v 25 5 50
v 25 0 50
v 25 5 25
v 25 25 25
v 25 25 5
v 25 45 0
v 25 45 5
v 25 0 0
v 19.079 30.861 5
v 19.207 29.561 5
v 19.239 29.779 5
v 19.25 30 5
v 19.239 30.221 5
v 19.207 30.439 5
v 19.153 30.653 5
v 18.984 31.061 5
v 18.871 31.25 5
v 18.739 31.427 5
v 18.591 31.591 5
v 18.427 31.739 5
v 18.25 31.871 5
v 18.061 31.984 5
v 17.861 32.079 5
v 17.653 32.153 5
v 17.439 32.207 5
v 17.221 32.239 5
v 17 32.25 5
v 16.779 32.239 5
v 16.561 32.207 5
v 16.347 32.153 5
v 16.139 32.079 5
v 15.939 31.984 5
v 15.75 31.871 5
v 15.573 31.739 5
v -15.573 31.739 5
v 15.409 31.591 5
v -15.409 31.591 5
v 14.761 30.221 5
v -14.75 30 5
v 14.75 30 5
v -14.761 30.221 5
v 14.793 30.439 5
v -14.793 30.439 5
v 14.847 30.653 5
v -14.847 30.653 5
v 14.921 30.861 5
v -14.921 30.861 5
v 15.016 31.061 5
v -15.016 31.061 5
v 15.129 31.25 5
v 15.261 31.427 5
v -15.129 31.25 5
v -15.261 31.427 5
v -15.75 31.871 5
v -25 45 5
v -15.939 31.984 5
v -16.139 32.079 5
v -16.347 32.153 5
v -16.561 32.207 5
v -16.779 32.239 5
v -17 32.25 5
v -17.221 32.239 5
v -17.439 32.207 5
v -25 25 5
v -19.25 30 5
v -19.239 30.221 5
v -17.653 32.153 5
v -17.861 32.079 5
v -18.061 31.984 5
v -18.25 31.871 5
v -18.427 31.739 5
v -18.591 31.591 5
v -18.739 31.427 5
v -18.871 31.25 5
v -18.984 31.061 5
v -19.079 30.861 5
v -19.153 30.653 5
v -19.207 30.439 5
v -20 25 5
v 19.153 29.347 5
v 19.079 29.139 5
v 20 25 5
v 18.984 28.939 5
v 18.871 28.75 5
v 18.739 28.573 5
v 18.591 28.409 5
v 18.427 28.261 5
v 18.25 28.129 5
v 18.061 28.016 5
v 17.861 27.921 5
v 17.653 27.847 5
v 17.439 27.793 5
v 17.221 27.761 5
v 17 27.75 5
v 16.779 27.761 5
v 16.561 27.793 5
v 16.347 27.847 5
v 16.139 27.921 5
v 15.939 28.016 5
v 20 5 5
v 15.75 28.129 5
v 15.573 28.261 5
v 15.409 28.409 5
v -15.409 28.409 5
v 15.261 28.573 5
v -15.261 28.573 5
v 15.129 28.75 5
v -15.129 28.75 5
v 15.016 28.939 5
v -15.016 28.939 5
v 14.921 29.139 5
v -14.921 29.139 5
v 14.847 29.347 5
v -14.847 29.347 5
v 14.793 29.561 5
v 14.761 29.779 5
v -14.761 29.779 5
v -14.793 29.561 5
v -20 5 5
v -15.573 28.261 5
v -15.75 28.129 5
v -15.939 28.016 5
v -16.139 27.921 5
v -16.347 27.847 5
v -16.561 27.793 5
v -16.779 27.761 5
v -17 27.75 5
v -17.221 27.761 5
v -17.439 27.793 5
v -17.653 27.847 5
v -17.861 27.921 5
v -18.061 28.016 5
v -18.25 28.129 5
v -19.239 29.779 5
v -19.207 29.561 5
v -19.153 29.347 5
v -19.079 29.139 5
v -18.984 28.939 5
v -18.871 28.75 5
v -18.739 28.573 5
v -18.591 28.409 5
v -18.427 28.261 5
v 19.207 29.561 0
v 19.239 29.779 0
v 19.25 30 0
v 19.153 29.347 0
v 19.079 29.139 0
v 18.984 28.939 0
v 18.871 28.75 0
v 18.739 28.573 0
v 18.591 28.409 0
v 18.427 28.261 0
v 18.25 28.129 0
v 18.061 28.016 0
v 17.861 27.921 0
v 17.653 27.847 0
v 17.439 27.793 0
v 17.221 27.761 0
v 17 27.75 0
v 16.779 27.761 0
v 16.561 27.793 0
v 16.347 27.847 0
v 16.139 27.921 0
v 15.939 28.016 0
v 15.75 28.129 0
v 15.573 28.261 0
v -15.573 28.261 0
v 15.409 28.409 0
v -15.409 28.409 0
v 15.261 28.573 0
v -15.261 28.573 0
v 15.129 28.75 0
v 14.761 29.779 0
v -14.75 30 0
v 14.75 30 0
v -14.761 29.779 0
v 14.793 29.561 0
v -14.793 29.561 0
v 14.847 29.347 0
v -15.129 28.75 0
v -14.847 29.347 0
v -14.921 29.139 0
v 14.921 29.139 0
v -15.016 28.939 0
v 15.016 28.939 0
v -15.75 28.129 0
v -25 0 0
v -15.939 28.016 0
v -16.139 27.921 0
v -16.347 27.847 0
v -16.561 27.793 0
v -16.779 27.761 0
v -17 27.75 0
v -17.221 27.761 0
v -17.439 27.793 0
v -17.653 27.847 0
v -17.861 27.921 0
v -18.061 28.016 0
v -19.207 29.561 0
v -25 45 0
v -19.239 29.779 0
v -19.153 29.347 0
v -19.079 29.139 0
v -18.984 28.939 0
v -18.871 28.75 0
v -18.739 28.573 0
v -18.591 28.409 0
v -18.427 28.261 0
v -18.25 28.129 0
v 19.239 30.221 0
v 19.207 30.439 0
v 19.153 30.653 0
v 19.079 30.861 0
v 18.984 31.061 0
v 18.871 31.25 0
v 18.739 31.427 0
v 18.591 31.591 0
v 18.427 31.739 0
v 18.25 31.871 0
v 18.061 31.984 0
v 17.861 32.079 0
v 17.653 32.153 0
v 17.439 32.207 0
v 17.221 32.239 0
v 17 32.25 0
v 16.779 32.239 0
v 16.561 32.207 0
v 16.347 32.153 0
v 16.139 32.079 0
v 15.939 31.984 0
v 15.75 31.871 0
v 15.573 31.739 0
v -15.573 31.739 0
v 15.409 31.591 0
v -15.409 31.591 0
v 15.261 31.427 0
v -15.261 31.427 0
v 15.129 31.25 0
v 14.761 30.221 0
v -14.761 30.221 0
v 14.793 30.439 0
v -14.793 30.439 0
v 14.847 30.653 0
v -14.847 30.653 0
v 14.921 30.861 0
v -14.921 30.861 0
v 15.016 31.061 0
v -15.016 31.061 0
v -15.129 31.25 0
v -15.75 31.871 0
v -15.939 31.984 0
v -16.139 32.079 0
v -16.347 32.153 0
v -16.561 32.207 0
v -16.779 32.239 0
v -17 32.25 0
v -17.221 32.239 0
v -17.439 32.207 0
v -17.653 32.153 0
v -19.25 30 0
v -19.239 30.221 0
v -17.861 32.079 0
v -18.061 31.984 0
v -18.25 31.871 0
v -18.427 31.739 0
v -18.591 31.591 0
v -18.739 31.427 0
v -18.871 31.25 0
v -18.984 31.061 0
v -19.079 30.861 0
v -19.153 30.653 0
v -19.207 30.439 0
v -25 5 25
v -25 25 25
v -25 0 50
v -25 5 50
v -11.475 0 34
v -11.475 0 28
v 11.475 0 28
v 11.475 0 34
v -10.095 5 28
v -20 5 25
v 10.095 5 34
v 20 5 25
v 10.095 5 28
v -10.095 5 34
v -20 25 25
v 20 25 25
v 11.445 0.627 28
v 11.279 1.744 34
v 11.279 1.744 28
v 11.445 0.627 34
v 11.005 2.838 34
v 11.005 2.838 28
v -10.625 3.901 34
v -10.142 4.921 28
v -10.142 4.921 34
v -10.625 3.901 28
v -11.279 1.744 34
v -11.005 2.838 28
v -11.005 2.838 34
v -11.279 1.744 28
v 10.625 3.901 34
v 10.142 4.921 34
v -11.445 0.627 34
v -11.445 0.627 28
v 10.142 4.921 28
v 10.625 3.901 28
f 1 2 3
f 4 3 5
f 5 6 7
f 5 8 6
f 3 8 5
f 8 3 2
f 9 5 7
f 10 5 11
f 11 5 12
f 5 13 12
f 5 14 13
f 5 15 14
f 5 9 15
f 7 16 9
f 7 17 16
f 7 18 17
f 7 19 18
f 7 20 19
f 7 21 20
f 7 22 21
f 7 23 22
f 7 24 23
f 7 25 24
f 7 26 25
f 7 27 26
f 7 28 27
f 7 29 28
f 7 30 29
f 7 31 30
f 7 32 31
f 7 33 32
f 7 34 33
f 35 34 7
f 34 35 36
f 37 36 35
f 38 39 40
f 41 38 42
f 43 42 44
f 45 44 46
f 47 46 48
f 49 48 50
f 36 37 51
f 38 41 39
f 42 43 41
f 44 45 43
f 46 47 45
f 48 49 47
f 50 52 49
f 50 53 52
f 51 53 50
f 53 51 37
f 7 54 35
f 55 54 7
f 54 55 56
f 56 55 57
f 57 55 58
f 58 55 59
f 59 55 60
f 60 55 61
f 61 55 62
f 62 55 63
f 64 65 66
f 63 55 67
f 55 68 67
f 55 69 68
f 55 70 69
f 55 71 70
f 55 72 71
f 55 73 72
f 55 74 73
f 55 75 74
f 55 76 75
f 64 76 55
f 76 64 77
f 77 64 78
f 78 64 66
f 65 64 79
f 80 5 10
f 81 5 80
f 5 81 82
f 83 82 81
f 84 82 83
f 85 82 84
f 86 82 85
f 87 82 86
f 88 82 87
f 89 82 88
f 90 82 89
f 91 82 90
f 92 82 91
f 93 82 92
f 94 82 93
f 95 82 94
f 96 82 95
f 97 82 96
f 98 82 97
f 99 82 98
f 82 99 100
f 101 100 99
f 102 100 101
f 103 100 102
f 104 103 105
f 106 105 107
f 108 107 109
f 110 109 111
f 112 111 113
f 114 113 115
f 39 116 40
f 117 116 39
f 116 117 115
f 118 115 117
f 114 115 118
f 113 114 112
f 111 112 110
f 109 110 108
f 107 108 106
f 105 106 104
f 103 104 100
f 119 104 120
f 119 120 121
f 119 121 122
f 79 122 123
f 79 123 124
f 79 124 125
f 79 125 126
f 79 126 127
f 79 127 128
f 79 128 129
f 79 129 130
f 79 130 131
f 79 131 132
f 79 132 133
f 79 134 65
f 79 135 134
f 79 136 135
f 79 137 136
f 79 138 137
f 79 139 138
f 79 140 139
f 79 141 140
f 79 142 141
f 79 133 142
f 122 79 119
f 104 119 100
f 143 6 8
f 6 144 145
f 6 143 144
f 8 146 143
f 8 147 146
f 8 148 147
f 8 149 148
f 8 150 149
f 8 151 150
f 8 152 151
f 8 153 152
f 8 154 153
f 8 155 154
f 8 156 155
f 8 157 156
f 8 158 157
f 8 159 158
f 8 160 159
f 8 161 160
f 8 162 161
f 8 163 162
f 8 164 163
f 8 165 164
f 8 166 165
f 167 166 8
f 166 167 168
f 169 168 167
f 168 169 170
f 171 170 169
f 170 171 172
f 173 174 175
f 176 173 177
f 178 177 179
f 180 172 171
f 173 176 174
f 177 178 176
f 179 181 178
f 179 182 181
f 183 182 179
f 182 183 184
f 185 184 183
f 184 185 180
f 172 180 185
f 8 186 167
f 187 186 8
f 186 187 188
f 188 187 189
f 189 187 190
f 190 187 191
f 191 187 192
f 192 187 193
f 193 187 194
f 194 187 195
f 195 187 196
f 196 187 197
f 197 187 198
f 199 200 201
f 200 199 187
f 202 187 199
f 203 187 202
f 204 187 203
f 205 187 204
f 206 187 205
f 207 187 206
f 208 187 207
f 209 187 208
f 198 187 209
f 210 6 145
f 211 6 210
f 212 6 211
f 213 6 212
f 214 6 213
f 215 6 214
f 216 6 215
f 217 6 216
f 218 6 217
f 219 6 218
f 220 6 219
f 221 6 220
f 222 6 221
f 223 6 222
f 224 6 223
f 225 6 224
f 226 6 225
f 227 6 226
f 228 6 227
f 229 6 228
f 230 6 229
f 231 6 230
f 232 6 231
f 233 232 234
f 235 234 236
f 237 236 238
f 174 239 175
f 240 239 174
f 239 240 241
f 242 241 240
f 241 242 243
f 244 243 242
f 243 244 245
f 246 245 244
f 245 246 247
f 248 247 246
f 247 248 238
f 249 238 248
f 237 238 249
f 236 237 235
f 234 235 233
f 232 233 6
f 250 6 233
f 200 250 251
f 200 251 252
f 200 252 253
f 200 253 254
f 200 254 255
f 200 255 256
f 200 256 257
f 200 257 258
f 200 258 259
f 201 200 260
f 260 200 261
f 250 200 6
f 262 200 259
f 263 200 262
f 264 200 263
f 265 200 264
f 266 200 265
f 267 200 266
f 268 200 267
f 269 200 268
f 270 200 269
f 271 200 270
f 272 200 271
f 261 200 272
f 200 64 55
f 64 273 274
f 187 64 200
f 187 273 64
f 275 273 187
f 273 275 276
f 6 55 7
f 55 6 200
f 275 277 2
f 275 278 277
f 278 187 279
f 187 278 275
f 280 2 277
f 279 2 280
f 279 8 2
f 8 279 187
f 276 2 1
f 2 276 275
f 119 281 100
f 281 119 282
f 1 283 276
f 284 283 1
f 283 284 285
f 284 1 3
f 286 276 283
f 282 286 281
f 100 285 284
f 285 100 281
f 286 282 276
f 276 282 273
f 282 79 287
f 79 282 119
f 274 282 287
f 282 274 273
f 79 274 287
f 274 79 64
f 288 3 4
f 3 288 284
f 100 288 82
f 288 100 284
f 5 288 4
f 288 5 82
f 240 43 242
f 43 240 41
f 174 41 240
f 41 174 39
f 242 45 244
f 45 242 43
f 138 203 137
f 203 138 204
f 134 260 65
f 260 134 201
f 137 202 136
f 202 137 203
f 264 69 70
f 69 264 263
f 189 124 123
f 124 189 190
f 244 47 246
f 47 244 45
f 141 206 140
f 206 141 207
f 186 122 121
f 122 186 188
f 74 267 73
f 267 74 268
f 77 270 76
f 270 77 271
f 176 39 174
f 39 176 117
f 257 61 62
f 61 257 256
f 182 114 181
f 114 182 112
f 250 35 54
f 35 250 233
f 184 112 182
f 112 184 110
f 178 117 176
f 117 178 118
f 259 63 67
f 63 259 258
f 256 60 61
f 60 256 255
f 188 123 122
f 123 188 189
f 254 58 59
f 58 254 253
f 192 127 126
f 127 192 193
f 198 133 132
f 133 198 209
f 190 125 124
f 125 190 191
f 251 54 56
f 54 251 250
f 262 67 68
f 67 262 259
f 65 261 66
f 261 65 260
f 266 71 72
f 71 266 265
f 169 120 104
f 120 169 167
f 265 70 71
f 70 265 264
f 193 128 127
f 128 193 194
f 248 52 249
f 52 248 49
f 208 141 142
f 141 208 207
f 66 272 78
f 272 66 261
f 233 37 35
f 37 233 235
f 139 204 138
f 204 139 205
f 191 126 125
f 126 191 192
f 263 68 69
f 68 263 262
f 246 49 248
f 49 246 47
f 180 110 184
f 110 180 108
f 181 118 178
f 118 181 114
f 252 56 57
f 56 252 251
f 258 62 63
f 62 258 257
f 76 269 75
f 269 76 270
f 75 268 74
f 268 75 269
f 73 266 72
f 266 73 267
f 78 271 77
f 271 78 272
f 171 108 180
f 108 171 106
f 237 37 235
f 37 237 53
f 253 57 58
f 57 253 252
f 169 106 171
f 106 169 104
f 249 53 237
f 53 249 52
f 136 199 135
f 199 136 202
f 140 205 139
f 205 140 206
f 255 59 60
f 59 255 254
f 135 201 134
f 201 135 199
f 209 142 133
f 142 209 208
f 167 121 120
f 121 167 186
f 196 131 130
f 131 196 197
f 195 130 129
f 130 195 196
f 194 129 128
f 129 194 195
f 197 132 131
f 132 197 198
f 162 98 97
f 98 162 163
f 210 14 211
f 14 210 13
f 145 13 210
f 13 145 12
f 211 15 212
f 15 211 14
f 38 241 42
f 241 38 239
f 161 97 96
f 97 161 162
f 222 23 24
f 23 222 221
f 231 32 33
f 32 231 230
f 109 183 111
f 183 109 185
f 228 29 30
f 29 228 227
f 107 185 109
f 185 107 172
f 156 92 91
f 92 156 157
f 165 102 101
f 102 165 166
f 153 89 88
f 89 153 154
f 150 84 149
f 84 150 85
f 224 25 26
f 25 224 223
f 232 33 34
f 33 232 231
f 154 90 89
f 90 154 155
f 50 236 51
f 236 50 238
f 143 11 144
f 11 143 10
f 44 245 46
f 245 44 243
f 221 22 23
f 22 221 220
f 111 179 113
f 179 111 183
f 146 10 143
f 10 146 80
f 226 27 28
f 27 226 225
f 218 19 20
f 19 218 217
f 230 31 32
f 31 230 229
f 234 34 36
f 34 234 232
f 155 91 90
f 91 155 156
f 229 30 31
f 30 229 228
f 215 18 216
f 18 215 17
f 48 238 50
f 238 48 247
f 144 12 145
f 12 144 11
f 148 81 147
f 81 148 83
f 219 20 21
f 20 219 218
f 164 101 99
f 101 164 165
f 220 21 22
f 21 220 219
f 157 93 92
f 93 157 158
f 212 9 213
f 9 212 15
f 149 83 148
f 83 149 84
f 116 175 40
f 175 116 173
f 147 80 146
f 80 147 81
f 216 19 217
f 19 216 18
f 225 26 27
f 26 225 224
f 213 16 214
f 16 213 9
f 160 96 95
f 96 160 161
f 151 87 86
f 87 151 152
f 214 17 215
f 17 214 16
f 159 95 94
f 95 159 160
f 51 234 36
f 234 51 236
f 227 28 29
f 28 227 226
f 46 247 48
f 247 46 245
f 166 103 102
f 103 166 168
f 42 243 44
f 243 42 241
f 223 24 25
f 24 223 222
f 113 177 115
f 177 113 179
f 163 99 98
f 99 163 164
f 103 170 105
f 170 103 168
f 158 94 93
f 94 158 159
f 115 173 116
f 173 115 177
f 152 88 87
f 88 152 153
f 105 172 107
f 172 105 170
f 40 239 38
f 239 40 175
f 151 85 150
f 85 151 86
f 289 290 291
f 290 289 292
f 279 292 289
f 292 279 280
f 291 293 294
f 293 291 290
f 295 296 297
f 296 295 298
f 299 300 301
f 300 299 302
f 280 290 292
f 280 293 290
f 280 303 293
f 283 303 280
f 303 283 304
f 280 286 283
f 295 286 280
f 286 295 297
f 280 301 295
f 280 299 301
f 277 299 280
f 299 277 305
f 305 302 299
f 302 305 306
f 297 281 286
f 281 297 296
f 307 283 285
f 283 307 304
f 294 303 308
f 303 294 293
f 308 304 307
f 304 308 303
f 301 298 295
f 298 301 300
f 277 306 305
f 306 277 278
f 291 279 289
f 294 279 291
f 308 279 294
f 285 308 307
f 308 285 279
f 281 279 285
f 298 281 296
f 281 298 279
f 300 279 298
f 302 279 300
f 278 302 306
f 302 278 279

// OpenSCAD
// L-shaped mounting bracket for NEMA 17 stepper motor (e.g. syringe pump)
// Print orientation: base plate on the bed (z = 0), vertical plate builds up along +Z

$fn = 64;

// ---------- Base plate ----------
base_x_min   = -25;   // base plate X start
base_x_max   = 25;    // base plate X end
base_y_min   = 0;     // base plate Y start (back edge)
base_y_max   = 45;    // base plate Y end (front edge)
base_thick   = 5;     // base plate thickness (Z)

// ---------- Vertical motor plate ----------
vert_y_min   = 0;     // motor plate Y start
vert_y_max   = 5;     // motor plate Y end (thickness)
vert_height  = 50;    // motor plate height (Z)

// ---------- Boss hole ----------
boss_d       = 23;    // motor centring boss hole diameter
boss_x       = 0;     // boss hole X centre
boss_z       = 28;    // boss hole Z centre

// ---------- Screw holes ----------
screw_d      = 3.4;   // M3 screw hole diameter
screw_pitch  = 31;    // screw hole pattern pitch (square)

// ---------- Gussets ----------
gusset_x1    = -25;   // left guset X start
gusset_x2    = -20;   // left guset X end
gusset_x3    = 20;    // right guset X start
gusset_x4    = 25;    // right guset X end
gusset_leg   = 20;    // guset leg lengths (Y and Z)
gusset_y0    = 5;     // guset Y start (plates meet)
gusset_z0    = 5;     // guset Z start (plates meet)

// ---------- Through-holes ----------
hole_d       = 4.5;   // M4 through-hole diameter
hole_x       = [-17, 17]; // through-hole X positions
hole_y       = 30;    // through-hole Y position

// ---------- Cut overshoot ----------
eps          = 0.5;   // extension of cutters past faces

difference() {
    union() {
        // Base plate
        translate([base_x_min, base_y_min, 0])
            cube([base_x_max - base_x_min, base_y_max - base_y_min, base_thick]);

        // Vertical motor plate
        translate([base_x_min, vert_y_min, 0])
            cube([base_x_max - base_x_min, vert_y_max - vert_y_min, vert_height]);

        // Left gusset (right-angle corner at y = 5, z = 5)
        translate([gusset_x1, gusset_y0, gusset_z0])
            cube([gusset_x2 - gusset_x1, gusset_leg, gusset_leg]);

        // Right gusset (right-angle corner at y = 5, z = 5)
        translate([gusset_x3, gusset_y0, gusset_z0])
            cube([gusset_x4 - gusset_x3, gusset_leg, gusset_leg]);
    }

    // Boss hole along Y
    translate([boss_x, vert_y_min - eps, boss_z])
        cylinder(d = boss_d, h = vert_y_max - vert_y_min + 2 * eps);

    // M3 screw holes on square pattern centred on boss hole
    for (screw_y = [-(screw_pitch / 2), screw_pitch / 2])
        for (screw_x = [-(screw_pitch / 2), screw_pitch / 2])
            translate([boss_x + screw_x, vert_y_min - eps + screw_y, boss_z])
                cylinder(d = screw_d, h = vert_y_max - vert_y_min + 2 * eps);

    // M4 through-holes in base plate
    for (hx = hole_x)
        translate([hx, hole_y, -eps])
            cylinder(d = hole_d, h = base_thick + 2 * eps);
}
